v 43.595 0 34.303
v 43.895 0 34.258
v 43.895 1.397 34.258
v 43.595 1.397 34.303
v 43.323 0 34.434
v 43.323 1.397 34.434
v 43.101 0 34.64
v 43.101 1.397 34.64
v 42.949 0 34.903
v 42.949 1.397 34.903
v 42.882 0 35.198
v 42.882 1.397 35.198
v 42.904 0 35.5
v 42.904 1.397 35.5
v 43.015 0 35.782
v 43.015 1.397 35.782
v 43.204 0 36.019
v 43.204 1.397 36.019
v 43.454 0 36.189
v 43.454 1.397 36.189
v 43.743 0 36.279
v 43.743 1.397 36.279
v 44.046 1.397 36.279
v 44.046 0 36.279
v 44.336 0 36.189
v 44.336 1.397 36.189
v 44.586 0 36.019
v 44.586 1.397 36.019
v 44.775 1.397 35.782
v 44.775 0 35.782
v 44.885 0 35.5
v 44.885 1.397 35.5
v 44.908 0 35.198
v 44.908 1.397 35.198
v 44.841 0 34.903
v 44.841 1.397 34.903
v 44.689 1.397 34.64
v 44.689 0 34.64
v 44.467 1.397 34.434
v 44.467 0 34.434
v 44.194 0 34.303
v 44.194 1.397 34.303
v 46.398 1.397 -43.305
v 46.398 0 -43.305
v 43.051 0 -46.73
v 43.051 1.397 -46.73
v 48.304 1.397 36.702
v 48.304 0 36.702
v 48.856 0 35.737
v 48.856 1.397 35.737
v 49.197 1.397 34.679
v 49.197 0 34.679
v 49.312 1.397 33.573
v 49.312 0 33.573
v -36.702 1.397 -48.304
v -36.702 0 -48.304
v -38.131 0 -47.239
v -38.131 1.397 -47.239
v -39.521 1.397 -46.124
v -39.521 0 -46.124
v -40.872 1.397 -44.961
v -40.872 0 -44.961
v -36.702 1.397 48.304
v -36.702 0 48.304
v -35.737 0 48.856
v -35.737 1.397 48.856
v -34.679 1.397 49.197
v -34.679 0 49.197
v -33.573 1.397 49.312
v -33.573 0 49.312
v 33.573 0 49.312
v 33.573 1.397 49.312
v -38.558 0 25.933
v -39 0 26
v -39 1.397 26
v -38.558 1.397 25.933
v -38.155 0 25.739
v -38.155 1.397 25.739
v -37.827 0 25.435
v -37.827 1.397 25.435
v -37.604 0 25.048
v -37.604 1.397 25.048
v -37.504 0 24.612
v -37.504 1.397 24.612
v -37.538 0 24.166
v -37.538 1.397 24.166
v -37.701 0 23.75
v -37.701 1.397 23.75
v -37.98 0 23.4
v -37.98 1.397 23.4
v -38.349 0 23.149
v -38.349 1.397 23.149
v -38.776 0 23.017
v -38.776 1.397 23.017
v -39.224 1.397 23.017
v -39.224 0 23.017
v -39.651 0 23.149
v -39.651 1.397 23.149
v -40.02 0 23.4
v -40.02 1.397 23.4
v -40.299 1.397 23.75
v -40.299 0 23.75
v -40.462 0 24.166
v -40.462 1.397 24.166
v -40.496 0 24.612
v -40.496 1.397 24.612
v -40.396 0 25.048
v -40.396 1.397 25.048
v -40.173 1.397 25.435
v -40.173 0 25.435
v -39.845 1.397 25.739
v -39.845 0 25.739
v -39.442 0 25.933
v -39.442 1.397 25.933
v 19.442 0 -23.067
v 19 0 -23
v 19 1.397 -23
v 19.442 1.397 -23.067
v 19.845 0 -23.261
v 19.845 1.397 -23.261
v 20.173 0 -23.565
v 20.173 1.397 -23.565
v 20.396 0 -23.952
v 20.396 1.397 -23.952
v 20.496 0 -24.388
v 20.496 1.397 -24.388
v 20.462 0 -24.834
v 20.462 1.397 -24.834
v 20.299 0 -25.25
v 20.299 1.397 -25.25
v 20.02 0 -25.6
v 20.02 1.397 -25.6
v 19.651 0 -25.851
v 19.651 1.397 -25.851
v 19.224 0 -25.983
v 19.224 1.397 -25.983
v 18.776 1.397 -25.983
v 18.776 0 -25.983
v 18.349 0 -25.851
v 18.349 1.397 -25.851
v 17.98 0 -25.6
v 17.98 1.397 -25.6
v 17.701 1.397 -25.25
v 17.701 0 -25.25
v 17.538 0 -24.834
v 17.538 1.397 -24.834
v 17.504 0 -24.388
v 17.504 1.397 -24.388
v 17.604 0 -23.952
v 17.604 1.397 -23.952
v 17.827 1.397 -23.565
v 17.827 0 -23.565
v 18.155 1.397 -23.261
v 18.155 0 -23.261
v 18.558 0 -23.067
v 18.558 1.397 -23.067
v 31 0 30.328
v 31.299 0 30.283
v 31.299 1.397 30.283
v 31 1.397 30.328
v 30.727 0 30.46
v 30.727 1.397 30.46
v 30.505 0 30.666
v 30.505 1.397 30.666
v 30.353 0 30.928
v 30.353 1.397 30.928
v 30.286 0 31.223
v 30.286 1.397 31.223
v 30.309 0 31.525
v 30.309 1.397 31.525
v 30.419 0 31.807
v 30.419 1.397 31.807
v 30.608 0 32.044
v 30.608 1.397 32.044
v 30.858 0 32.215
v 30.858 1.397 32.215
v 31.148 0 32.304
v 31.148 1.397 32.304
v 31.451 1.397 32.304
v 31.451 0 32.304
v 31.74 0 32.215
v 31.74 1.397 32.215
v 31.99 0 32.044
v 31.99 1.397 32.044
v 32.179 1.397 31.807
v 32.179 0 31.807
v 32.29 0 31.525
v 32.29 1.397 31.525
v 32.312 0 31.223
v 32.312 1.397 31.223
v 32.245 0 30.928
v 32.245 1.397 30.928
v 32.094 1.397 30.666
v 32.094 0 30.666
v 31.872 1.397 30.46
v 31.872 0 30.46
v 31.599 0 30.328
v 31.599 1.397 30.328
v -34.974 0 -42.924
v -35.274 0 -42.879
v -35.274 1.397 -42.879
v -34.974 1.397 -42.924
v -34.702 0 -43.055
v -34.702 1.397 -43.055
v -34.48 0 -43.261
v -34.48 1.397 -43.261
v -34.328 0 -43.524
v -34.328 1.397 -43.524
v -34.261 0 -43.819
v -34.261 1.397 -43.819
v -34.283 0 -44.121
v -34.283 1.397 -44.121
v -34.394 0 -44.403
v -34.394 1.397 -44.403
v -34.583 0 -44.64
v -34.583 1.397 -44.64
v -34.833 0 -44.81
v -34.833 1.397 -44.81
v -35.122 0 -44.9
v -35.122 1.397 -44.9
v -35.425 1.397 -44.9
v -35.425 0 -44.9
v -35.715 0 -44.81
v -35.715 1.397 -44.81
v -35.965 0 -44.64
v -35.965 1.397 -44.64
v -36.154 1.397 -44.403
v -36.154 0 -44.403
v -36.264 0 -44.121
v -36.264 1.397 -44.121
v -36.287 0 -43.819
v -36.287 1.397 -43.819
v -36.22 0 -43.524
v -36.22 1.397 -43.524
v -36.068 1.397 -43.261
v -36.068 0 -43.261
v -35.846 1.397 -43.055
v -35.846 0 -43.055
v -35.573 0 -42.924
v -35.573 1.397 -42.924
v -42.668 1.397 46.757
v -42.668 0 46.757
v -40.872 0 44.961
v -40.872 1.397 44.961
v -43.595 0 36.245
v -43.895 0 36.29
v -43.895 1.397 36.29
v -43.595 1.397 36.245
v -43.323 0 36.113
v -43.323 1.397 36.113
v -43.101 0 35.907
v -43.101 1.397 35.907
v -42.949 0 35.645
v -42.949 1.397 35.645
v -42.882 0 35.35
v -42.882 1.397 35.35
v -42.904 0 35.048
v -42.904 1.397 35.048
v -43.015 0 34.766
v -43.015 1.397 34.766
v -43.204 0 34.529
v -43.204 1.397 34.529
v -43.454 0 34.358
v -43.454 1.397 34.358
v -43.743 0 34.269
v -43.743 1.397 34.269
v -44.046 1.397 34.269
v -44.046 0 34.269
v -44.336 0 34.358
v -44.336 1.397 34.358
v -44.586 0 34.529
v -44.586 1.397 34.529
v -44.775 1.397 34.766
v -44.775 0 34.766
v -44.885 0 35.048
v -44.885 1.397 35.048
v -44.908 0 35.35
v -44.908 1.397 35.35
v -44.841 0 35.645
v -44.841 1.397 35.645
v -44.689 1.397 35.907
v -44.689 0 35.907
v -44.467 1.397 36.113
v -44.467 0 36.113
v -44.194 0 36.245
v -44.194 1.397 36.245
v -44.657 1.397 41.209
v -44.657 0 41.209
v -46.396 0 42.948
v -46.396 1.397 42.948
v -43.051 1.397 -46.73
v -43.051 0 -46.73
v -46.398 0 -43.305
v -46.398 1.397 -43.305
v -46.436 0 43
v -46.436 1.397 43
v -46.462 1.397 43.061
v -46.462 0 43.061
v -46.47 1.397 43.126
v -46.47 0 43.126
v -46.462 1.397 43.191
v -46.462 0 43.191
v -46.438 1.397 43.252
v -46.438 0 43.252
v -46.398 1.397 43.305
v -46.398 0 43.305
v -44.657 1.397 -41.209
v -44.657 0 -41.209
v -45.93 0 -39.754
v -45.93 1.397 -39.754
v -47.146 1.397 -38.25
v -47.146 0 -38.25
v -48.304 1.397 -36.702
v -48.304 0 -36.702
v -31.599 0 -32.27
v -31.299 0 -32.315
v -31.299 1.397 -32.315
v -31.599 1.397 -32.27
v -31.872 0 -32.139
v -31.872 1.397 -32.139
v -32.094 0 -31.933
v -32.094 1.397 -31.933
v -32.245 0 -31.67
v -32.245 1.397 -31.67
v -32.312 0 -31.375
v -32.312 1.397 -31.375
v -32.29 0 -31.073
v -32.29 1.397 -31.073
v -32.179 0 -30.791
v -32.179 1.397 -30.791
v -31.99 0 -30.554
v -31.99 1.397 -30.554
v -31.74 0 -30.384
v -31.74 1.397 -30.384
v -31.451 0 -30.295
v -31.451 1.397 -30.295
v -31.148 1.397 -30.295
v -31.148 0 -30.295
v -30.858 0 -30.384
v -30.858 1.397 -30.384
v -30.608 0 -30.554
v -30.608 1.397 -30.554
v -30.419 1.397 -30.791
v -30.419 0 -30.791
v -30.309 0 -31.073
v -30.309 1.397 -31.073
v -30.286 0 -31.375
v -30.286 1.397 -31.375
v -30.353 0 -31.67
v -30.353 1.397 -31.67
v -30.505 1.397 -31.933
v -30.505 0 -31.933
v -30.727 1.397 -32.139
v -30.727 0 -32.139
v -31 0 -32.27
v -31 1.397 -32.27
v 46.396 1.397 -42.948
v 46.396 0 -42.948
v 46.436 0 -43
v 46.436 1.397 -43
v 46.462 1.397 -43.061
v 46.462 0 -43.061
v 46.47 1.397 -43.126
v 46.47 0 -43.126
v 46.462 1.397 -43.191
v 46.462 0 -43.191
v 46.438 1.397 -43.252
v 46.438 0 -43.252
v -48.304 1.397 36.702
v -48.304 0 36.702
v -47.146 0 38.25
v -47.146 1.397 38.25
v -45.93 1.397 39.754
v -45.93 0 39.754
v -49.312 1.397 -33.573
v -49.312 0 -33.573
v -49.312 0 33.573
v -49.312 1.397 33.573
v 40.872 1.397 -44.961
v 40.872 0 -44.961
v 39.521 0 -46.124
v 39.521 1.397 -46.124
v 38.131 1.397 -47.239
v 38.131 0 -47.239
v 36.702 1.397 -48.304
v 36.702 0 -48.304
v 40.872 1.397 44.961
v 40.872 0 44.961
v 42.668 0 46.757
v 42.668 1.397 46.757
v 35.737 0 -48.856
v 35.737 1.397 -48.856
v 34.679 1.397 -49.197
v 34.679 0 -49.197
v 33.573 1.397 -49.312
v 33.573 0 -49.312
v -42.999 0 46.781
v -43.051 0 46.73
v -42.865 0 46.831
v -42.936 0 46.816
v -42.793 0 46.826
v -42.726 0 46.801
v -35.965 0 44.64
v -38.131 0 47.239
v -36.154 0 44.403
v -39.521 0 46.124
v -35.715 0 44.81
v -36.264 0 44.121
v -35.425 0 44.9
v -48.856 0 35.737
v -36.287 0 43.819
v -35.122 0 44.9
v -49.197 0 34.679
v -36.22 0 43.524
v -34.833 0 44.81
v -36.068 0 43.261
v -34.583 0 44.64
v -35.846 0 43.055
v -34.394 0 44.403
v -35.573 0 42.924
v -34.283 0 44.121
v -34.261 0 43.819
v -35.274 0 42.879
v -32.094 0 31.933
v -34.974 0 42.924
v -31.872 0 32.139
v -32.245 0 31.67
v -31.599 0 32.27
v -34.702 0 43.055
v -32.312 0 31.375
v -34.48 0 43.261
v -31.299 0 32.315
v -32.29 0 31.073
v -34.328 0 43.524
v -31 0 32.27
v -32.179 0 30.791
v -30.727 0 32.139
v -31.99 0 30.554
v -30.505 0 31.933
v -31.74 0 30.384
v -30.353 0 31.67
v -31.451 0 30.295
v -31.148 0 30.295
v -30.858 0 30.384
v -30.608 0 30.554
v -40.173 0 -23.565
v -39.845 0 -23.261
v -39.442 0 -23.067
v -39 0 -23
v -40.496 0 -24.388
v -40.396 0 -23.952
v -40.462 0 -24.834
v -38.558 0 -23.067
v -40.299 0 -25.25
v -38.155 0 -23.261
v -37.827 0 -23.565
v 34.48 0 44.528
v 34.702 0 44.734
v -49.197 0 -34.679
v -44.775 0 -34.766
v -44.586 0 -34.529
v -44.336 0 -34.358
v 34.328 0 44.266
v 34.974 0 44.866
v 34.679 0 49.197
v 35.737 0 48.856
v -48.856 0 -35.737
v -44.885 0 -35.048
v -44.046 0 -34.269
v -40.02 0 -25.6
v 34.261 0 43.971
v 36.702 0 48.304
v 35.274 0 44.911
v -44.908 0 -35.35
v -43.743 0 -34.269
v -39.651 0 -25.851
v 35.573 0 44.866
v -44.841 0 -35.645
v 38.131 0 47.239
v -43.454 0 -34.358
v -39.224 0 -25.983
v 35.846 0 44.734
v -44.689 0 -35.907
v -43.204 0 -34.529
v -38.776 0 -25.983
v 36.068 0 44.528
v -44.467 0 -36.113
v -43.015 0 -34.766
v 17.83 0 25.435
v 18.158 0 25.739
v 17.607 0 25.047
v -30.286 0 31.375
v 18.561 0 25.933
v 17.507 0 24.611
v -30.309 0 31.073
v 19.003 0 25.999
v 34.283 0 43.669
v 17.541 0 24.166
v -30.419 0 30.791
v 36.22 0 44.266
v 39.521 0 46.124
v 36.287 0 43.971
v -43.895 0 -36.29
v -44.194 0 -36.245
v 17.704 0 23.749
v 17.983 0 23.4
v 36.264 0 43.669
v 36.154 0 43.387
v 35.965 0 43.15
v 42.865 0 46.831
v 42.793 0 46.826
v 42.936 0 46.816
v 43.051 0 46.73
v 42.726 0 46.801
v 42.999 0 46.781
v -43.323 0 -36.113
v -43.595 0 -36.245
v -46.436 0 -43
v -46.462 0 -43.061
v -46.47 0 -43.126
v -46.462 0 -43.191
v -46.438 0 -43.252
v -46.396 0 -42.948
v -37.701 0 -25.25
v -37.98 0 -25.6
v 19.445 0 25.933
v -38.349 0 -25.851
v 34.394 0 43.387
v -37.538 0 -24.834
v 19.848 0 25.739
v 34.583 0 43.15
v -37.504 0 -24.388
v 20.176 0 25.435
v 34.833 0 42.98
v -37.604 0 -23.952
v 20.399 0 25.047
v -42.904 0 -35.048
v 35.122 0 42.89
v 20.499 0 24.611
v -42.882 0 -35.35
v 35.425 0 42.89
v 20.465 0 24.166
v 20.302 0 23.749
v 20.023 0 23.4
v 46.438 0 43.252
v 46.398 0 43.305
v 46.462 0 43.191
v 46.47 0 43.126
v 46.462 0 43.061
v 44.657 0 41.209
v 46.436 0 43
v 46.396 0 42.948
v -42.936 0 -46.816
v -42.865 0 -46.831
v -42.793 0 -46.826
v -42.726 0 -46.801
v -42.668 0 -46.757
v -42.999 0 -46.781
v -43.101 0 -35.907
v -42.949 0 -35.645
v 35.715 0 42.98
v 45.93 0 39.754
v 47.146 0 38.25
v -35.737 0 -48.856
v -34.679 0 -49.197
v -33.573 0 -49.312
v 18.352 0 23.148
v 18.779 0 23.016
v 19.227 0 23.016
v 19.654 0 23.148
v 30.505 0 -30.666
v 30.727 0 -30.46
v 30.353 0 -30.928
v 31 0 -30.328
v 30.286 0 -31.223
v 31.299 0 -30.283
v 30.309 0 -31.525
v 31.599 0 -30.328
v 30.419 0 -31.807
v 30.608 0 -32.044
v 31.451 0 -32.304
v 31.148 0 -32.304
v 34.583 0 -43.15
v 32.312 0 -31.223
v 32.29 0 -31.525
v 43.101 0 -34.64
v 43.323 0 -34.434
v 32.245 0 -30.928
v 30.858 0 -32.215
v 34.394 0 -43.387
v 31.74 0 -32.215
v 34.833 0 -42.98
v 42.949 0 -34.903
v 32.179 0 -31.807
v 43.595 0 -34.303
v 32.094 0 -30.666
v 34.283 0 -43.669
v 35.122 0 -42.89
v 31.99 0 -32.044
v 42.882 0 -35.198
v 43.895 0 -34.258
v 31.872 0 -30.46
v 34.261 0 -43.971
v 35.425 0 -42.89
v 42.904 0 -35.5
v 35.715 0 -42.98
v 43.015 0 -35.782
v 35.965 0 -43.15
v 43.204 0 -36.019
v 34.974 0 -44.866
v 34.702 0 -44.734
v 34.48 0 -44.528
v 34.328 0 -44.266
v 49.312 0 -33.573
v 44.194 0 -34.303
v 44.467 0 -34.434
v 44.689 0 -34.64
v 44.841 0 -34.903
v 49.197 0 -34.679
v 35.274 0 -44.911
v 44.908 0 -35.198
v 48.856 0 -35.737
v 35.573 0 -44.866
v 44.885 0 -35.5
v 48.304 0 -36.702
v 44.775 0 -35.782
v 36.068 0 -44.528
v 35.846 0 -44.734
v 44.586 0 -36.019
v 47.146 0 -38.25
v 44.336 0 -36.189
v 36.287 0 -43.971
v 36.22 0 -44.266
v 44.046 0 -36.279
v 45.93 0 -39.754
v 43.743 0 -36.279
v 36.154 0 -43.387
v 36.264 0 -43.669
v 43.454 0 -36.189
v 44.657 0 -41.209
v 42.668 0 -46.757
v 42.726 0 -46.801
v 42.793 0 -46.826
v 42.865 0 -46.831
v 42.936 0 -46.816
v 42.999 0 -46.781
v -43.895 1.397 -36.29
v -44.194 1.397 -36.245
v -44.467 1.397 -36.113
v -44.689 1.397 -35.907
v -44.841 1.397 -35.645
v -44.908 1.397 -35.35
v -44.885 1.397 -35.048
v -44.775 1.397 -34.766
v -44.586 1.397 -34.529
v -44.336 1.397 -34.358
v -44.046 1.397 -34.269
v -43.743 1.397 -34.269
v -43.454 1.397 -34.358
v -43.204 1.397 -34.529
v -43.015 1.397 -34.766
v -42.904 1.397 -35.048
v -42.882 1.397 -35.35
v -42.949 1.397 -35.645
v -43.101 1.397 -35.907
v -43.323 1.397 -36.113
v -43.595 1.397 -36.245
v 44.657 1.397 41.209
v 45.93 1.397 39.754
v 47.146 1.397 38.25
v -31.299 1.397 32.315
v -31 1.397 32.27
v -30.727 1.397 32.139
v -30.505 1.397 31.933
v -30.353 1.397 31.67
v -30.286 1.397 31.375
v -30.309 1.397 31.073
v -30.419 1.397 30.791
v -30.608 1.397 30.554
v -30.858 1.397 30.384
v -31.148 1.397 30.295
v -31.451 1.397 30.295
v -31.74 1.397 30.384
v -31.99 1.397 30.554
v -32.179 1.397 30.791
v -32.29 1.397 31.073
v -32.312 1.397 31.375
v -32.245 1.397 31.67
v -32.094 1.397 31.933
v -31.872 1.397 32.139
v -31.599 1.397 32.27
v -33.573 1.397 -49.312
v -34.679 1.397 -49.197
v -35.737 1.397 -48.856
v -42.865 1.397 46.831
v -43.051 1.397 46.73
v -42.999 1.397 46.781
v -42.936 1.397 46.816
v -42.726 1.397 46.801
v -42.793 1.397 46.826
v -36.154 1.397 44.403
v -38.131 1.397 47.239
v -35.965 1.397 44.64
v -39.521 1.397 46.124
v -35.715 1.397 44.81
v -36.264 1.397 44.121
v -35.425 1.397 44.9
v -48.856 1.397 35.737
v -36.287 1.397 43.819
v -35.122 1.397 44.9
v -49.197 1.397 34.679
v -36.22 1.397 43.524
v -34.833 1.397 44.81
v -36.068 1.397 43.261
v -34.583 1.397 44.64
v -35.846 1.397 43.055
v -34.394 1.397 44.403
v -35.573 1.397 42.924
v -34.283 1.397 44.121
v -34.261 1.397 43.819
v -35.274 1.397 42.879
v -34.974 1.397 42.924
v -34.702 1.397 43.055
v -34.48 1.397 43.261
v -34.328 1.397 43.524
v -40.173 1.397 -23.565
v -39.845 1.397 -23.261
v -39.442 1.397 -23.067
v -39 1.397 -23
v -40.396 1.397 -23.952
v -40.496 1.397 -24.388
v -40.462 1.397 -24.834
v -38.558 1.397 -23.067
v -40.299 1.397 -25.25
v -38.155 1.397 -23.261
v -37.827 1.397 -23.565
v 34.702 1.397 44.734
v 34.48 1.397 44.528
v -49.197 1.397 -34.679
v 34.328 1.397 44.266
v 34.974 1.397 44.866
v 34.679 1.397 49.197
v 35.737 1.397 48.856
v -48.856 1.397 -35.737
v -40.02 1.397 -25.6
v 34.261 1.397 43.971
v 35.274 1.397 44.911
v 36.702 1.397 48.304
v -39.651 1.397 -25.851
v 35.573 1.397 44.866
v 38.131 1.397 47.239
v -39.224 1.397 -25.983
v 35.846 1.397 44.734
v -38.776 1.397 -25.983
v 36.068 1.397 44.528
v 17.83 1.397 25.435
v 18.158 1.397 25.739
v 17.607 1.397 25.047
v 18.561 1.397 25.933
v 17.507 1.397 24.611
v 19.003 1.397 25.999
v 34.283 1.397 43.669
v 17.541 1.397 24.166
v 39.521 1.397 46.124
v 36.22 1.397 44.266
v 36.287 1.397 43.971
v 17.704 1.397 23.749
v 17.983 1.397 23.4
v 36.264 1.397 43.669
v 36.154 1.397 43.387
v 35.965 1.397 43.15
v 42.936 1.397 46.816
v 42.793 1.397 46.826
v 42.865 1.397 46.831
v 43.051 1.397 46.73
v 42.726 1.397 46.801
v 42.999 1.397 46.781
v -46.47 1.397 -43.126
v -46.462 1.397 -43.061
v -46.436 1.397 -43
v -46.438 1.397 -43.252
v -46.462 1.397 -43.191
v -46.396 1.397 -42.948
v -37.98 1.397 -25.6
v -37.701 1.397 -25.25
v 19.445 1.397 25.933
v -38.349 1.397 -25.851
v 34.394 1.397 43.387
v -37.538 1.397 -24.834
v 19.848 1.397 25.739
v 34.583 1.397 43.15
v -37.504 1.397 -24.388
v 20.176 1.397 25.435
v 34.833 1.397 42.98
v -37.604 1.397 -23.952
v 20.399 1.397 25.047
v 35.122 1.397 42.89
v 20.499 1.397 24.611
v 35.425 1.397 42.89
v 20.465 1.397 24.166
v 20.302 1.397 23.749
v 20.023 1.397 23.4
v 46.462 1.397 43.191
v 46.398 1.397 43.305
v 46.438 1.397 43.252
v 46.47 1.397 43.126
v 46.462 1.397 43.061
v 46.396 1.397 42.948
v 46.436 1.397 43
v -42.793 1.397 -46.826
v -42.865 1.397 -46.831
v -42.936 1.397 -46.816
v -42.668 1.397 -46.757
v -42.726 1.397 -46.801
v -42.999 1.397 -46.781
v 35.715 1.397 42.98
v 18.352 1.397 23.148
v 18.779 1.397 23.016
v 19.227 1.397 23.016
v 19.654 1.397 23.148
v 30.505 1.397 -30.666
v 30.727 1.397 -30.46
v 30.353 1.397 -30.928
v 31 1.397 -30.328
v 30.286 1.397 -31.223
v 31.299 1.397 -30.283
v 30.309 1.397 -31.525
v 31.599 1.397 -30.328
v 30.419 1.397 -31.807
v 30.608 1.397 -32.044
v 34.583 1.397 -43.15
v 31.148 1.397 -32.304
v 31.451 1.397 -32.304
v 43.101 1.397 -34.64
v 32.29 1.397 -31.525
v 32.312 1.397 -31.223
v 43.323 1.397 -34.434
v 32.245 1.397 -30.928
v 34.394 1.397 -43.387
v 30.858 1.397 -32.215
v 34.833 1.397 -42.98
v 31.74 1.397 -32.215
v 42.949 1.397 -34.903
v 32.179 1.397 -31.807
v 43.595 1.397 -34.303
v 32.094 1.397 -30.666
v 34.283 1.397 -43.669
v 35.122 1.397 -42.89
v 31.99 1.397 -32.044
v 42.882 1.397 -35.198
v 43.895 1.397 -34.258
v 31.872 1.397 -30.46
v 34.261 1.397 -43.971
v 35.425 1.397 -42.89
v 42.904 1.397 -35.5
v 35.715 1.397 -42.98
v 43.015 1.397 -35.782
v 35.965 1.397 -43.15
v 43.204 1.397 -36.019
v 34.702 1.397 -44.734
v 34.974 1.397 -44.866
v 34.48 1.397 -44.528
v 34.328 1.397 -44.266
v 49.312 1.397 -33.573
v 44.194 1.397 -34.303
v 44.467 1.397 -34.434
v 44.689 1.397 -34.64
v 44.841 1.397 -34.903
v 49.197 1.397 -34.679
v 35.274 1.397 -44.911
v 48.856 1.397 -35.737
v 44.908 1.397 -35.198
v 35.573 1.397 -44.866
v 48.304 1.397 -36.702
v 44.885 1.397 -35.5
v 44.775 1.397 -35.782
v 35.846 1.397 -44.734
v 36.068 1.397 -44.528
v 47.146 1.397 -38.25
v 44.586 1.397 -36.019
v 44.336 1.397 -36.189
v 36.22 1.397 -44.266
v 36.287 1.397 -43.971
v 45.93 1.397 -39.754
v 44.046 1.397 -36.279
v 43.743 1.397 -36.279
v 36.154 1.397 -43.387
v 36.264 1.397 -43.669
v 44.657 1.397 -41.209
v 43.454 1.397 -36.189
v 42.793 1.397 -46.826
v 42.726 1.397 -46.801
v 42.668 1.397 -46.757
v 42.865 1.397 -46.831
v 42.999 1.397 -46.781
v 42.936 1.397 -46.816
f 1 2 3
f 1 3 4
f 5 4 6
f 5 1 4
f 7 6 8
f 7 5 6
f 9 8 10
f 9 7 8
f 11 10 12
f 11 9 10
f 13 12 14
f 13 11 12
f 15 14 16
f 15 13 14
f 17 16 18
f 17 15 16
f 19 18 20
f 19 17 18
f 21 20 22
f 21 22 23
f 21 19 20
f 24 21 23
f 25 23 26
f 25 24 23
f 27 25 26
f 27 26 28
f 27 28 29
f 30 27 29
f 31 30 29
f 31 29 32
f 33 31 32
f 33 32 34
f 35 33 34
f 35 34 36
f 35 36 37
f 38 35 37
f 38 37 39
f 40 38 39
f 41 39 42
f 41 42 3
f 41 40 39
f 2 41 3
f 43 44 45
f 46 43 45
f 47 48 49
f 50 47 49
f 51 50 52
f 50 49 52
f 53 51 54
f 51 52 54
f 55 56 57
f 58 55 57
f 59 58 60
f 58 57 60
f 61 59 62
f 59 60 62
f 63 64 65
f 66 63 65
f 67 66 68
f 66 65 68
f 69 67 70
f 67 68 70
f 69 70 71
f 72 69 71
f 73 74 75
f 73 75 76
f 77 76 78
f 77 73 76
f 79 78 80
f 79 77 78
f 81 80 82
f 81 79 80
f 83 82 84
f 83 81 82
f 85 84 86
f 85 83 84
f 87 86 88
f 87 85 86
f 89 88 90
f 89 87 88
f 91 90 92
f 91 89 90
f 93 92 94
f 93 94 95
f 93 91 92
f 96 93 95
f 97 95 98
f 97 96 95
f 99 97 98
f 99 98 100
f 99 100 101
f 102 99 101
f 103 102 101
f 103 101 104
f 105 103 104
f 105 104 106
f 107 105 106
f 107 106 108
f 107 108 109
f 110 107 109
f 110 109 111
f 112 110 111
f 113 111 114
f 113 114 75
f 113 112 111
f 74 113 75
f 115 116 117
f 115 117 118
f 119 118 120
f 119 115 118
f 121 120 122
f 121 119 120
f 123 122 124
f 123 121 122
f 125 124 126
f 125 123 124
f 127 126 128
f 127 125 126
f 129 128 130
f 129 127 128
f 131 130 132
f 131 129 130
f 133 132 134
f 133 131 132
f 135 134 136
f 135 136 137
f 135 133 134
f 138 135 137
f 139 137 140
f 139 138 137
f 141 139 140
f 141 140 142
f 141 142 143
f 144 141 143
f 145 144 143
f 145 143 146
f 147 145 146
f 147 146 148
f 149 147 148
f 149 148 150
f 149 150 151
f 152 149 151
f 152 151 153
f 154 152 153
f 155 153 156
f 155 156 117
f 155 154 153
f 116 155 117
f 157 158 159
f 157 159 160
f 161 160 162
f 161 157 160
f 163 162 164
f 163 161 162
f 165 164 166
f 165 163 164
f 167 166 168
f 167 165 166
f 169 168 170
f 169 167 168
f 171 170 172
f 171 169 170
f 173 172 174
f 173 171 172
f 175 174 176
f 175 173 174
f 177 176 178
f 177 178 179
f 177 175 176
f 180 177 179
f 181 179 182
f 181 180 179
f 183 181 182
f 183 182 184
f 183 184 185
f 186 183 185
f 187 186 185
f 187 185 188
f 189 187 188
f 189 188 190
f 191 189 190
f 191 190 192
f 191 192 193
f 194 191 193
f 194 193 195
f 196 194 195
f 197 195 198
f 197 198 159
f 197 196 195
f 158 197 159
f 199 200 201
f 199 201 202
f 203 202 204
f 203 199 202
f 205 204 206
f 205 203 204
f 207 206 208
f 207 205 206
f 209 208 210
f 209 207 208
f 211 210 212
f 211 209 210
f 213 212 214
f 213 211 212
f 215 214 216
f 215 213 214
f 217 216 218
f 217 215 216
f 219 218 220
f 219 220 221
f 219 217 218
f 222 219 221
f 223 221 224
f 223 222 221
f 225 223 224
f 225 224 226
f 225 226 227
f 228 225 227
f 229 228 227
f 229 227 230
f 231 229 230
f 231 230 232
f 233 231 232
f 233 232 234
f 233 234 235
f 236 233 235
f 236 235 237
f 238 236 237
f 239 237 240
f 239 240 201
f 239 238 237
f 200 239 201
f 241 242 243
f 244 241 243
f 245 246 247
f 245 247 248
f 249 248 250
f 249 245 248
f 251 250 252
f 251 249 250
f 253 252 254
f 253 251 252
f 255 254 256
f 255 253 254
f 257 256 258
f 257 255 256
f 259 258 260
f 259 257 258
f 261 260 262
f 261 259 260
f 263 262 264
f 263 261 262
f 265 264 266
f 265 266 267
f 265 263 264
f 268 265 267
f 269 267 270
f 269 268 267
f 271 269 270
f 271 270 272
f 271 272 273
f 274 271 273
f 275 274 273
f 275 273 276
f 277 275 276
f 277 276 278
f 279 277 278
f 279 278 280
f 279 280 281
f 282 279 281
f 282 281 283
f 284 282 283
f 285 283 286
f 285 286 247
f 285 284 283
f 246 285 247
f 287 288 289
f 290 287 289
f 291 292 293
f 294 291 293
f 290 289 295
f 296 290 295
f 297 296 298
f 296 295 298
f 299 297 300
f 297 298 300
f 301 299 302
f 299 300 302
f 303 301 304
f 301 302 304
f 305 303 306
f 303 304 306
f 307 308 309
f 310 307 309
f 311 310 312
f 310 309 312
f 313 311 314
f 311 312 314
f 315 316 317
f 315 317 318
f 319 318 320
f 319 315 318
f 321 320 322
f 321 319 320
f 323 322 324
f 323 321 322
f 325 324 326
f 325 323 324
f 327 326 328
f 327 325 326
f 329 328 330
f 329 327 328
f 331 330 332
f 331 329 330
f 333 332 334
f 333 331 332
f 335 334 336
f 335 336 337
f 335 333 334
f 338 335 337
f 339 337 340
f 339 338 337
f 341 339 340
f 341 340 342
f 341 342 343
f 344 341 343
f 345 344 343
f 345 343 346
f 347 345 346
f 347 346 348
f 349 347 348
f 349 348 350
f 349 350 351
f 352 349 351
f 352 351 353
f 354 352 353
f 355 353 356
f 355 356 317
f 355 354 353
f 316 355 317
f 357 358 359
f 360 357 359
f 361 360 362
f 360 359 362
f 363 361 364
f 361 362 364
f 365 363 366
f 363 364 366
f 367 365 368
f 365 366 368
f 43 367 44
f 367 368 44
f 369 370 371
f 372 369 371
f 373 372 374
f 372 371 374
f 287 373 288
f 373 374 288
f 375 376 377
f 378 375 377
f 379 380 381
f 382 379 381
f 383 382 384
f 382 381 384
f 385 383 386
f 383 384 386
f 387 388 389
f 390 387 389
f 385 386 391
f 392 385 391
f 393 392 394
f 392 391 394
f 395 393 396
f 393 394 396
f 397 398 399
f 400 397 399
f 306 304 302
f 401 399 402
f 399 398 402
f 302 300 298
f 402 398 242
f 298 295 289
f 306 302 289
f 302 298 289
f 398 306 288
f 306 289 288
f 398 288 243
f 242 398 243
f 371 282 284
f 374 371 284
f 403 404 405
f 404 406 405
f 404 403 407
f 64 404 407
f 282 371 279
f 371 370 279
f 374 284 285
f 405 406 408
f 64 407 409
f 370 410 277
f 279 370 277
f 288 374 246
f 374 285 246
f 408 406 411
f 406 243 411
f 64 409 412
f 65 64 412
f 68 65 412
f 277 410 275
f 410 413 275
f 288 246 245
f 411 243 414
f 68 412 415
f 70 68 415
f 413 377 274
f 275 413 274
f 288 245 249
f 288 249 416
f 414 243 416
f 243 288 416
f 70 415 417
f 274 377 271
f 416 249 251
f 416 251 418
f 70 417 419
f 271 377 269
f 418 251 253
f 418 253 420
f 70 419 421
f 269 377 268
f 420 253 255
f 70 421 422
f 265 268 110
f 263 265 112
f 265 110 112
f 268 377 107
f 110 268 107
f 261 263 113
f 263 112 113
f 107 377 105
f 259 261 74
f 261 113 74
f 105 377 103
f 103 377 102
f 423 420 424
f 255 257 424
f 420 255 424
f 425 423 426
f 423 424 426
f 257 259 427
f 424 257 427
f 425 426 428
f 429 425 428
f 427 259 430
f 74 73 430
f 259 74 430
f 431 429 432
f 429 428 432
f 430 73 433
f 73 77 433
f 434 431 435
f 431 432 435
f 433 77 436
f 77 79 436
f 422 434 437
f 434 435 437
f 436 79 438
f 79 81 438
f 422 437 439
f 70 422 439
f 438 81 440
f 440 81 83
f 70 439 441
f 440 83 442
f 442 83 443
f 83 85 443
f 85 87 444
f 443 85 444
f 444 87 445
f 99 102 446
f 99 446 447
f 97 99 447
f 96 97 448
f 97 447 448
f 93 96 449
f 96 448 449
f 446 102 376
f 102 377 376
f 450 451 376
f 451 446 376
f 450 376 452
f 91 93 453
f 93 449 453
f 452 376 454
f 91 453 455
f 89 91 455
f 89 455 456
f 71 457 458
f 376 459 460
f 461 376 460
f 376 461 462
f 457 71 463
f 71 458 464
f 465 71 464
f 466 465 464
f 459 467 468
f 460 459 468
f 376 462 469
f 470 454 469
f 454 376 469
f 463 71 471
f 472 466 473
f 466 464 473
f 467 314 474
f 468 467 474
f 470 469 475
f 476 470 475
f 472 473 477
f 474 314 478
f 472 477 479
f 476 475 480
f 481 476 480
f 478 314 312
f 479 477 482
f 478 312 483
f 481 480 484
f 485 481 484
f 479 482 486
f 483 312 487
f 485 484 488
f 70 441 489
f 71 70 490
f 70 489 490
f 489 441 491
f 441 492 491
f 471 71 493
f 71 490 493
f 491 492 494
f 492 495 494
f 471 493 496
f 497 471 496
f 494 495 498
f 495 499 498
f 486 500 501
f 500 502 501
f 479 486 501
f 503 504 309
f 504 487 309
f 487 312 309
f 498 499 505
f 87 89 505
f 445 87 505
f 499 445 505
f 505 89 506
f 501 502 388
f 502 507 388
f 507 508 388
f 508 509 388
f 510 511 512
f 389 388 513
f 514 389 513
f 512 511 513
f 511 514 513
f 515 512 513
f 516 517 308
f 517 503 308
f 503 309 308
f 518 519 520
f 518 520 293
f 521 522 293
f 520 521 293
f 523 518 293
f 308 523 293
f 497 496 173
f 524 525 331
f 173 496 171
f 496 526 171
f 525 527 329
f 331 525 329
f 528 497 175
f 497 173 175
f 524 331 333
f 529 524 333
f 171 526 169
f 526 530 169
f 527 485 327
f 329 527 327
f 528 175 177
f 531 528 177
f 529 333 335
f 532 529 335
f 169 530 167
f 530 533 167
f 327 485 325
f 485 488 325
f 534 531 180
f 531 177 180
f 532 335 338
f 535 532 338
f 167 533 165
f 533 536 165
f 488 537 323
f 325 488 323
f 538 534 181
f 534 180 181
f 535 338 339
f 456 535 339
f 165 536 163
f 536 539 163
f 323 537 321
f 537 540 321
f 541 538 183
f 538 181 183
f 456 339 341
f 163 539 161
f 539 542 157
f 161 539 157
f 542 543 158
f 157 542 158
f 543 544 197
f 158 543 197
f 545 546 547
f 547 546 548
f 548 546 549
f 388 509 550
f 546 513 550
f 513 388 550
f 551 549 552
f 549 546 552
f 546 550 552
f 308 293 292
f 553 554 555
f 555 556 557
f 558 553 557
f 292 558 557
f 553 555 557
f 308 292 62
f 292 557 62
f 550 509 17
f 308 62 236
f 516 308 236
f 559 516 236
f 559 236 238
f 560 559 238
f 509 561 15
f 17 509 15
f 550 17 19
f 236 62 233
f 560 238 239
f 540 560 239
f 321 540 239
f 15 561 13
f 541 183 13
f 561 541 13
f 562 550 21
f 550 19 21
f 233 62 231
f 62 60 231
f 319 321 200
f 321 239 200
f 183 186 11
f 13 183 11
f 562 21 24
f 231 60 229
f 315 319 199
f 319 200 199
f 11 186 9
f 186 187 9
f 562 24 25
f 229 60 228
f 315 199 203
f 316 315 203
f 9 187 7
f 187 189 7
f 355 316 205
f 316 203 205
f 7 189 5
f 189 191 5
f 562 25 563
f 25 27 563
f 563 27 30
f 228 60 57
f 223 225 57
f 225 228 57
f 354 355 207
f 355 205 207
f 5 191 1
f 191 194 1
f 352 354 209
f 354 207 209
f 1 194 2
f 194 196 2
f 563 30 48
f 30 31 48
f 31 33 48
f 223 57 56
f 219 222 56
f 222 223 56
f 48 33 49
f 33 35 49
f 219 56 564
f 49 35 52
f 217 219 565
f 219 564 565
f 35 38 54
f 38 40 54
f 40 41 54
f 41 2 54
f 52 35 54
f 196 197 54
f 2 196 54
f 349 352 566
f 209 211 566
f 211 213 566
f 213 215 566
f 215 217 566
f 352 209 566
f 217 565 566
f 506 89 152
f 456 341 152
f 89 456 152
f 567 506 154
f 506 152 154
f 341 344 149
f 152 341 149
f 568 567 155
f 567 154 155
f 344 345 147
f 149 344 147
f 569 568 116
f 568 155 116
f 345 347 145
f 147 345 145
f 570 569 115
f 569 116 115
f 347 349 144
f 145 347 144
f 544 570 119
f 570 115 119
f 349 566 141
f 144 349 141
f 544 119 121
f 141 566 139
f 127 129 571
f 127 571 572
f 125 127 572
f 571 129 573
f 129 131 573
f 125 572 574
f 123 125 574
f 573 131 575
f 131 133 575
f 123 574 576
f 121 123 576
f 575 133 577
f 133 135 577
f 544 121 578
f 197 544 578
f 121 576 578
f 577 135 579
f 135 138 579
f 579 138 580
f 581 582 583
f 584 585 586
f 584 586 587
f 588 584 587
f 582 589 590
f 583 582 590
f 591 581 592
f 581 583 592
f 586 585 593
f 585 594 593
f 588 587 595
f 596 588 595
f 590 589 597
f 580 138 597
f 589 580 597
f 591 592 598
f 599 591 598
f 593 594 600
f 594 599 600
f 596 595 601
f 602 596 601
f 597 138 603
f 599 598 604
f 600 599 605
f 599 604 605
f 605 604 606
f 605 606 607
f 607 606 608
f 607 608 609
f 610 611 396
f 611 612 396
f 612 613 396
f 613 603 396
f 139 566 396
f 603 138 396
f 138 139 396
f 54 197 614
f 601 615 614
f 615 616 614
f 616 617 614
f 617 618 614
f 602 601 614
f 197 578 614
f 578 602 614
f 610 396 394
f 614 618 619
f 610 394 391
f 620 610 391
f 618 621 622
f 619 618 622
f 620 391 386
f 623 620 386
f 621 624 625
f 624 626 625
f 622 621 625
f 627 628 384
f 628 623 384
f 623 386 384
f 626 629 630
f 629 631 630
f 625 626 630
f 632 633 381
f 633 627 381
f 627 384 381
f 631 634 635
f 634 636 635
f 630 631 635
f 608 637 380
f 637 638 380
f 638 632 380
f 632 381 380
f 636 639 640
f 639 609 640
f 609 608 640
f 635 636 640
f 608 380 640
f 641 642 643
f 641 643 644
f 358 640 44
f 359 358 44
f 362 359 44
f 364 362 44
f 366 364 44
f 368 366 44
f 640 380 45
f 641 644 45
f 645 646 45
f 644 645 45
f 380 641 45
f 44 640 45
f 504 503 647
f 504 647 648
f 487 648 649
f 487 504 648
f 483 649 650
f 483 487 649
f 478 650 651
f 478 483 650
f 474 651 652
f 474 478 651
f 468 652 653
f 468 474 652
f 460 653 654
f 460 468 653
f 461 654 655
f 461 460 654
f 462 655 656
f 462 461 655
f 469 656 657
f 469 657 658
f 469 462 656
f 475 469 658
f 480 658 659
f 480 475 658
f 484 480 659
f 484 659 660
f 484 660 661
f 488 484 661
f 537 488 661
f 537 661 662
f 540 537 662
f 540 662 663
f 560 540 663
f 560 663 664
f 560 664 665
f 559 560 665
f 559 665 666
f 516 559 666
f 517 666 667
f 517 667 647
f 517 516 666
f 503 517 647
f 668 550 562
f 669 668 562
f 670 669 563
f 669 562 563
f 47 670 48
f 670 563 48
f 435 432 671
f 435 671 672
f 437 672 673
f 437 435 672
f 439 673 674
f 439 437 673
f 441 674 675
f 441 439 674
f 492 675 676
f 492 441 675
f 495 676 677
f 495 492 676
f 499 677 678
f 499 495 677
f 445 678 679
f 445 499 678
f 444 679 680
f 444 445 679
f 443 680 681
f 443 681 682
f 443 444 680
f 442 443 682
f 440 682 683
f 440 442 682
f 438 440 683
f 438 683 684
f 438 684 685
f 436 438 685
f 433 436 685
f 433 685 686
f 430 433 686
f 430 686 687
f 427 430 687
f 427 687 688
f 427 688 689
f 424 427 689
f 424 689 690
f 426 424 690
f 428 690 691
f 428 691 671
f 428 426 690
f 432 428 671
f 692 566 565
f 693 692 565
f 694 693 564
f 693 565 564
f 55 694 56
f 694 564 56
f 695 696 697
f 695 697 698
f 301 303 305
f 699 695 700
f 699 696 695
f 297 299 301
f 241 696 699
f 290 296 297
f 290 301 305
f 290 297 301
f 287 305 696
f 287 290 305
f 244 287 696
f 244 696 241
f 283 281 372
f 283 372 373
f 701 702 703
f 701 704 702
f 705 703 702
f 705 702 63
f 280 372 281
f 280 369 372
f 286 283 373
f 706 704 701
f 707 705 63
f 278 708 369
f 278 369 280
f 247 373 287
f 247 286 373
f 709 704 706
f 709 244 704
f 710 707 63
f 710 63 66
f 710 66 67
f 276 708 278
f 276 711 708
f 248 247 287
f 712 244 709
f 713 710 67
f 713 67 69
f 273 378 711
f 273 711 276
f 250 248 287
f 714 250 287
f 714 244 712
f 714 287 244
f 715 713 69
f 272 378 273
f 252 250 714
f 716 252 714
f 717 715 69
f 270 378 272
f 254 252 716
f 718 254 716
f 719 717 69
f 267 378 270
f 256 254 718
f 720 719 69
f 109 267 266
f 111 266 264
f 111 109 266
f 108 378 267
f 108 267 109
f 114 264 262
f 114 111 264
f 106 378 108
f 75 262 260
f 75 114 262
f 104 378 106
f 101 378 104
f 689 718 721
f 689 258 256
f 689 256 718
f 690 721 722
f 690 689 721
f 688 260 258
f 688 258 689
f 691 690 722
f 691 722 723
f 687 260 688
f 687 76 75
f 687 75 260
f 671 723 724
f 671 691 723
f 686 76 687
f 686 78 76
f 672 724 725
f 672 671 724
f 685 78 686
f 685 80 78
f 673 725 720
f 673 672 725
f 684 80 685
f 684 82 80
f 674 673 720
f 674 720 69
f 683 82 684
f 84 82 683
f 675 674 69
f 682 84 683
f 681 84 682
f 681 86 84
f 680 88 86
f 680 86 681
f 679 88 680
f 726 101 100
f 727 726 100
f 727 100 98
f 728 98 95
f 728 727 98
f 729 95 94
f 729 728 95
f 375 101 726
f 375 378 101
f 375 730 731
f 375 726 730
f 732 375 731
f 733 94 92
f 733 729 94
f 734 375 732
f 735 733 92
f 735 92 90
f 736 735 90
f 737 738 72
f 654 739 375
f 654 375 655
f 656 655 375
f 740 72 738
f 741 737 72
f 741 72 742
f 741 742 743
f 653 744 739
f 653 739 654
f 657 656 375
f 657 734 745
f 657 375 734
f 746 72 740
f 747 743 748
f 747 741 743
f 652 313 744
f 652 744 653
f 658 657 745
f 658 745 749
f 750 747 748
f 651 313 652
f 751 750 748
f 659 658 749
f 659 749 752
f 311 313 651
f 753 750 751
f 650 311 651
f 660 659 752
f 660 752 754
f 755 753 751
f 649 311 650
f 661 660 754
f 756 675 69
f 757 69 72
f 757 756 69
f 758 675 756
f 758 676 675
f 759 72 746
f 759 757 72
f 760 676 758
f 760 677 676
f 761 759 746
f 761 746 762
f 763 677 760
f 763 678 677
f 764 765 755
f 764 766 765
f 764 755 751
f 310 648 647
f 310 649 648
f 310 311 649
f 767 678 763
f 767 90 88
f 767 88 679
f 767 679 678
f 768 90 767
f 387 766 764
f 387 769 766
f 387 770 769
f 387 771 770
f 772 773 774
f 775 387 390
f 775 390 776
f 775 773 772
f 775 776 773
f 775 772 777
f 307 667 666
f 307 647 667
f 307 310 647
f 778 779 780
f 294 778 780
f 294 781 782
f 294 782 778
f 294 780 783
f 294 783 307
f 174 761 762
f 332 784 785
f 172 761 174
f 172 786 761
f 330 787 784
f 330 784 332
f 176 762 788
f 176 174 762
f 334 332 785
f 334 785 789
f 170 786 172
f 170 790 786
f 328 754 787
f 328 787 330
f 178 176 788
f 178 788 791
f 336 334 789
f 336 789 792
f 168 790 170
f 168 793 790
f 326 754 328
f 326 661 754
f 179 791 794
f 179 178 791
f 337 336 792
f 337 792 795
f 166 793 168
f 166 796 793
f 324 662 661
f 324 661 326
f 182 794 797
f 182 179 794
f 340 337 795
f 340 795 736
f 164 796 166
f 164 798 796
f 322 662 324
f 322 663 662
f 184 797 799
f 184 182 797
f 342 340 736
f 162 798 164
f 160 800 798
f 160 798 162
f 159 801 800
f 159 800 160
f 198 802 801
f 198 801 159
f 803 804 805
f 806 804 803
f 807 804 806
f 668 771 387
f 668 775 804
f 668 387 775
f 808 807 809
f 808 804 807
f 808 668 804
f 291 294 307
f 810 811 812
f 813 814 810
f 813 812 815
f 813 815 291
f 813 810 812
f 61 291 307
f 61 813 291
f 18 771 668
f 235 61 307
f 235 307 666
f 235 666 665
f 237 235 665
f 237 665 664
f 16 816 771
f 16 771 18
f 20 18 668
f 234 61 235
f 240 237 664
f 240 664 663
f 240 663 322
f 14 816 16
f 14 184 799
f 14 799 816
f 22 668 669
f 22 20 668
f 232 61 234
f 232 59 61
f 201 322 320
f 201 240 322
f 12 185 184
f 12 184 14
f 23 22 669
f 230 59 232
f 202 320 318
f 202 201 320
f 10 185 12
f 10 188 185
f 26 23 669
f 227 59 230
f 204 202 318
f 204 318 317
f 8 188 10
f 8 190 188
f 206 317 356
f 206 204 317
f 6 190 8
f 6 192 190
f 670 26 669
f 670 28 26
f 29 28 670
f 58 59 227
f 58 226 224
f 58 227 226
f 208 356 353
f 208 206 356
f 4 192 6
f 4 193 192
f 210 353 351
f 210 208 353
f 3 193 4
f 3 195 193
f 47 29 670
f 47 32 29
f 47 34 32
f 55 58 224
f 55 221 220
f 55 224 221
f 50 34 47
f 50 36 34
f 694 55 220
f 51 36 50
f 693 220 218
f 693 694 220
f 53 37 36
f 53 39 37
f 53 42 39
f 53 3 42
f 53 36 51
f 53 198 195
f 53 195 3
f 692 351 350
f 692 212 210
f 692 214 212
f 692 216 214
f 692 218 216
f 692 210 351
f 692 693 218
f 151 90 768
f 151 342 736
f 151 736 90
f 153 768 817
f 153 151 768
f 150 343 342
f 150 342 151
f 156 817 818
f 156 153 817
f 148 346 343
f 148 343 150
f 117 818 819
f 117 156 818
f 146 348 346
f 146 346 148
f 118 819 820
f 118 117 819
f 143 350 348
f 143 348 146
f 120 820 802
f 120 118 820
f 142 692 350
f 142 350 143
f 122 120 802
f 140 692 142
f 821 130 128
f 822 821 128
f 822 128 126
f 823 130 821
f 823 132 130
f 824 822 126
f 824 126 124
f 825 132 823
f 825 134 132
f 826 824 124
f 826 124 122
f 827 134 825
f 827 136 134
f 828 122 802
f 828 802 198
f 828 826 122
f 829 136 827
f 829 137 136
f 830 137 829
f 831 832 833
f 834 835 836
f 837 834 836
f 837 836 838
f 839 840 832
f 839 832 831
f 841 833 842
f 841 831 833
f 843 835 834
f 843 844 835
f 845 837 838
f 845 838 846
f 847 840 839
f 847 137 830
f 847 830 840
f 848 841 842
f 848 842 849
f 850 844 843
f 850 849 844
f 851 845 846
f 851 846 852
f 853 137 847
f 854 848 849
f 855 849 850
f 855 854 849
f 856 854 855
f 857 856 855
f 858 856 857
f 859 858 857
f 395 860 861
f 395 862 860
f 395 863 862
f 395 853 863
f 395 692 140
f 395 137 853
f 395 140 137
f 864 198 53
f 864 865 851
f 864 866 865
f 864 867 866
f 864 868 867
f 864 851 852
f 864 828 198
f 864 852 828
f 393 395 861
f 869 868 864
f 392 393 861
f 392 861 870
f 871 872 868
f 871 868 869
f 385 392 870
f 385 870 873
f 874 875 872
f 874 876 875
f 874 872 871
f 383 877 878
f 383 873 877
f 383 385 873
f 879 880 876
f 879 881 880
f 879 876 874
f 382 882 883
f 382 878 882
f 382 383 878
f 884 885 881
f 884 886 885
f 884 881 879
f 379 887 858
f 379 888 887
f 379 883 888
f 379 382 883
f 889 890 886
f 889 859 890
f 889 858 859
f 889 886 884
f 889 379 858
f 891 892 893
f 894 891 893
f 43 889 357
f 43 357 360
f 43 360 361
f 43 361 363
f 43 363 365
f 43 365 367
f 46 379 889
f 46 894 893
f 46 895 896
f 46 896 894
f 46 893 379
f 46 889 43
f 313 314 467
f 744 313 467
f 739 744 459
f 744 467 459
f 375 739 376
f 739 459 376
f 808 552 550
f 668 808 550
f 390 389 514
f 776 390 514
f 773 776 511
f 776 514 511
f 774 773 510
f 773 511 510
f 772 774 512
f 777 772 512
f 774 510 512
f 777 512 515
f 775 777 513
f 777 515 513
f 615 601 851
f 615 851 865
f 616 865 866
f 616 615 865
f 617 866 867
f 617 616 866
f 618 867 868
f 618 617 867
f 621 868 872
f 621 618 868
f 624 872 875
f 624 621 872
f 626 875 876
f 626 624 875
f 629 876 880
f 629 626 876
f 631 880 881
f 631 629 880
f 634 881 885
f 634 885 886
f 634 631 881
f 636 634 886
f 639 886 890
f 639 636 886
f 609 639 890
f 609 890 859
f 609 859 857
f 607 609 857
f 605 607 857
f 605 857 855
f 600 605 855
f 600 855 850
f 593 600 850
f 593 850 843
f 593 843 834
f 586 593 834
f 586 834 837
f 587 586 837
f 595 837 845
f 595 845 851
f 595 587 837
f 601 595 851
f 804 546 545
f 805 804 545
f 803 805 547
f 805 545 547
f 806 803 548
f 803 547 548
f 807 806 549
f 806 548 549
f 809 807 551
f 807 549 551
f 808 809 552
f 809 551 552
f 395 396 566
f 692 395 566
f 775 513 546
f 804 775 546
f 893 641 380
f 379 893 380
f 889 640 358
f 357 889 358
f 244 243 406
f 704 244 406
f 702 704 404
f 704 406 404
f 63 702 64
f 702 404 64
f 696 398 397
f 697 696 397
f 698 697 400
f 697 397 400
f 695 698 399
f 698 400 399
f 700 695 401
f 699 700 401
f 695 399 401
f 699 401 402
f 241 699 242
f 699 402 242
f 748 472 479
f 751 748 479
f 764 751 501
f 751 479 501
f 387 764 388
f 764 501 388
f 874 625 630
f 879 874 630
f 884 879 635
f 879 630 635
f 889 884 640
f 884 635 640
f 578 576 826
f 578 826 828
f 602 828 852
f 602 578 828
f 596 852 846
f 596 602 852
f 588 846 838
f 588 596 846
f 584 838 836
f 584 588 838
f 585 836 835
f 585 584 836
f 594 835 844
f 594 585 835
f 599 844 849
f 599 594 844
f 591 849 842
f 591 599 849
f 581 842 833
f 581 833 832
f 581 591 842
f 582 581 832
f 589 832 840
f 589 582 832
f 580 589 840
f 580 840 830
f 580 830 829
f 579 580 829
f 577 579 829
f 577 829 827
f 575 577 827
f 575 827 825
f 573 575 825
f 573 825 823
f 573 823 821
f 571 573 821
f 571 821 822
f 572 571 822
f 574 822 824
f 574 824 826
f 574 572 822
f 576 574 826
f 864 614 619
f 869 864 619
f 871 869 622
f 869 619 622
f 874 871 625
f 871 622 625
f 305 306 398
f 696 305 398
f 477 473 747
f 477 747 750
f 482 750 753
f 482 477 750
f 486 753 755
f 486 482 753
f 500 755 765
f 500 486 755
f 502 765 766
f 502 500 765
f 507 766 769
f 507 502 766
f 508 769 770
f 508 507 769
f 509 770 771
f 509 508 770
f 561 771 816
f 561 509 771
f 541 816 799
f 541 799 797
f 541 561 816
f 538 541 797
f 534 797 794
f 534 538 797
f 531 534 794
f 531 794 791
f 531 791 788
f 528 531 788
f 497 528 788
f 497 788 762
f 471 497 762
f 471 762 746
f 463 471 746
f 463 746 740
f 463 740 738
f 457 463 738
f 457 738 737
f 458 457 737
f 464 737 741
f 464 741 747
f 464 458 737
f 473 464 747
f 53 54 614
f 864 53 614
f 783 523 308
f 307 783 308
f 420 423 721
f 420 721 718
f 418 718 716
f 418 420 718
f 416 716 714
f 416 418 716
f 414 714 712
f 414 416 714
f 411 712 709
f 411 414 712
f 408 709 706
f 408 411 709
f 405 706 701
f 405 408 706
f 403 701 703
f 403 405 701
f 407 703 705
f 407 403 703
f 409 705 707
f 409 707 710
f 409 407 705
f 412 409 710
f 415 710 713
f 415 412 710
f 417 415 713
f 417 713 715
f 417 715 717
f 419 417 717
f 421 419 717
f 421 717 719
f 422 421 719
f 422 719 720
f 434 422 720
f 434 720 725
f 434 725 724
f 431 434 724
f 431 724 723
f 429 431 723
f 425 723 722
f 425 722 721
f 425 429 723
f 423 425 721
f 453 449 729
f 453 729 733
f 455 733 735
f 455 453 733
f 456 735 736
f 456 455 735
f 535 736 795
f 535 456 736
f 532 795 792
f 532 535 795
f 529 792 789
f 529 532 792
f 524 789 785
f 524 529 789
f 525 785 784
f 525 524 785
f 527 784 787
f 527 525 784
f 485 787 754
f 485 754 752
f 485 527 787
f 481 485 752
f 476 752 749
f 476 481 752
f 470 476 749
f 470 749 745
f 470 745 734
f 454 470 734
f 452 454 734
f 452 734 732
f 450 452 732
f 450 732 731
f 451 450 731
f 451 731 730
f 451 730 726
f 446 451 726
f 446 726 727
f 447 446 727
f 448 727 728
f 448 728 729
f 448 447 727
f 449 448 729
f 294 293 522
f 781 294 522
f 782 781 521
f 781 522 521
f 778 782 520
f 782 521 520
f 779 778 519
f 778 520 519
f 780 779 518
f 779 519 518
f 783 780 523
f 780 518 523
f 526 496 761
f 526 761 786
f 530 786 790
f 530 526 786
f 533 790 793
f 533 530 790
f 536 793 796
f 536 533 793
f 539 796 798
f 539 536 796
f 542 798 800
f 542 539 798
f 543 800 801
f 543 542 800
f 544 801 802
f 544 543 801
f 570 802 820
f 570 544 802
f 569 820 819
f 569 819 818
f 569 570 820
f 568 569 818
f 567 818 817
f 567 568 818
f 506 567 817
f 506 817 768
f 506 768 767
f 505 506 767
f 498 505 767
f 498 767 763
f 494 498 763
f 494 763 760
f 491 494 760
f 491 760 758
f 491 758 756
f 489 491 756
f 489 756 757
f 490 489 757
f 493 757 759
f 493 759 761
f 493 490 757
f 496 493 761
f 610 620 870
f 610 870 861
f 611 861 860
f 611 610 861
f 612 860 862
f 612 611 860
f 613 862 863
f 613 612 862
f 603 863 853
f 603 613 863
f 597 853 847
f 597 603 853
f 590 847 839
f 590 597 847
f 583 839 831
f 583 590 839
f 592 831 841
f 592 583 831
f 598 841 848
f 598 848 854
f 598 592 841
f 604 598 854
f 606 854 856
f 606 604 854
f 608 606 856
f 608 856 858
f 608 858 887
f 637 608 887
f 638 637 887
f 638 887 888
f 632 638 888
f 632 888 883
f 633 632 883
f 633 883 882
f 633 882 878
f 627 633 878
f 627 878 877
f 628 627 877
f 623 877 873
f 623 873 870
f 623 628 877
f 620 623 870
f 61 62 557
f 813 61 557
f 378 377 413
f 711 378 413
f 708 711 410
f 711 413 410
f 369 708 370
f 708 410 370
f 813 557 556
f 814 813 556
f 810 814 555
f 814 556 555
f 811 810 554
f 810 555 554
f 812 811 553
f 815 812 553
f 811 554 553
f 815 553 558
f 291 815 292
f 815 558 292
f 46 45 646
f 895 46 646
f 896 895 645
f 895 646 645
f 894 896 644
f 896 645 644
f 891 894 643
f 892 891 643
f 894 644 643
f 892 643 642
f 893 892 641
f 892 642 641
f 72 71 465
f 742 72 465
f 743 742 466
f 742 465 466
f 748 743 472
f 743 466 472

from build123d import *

# Parameters (mm, degrees)
SKETCH1_R           = 1.016000002
SKETCH1_R_2         = 1.015999994
SKETCH1_R_3         = 1.016000004
SKETCH1_R_4         = 1.016000003
SKETCH1_R_5         = 1.5
BOSS_EXTRUDE1_DEPTH = 1.397


with BuildPart() as part:
    # Sketch1 → Boss-Extrude1 (new body)
    with BuildSketch(Plane(origin=(0, 0, 0), x_dir=(1, 0, 0), z_dir=(0, 1, 0))):
        with BuildLine():
            Line((-44.657487237, -41.209177315), (-46.396043566, -42.947733643))
            ThreePointArc((-46.396043566, -42.947733643), (-46.47043426, -43.125880979), (-46.398093321, -43.304870469))
            Line((-46.398093321, -43.304870469), (-43.050556902, -46.730153436))
            ThreePointArc((-43.050556902, -46.730153436), (-42.865374913, -46.831022486), (-42.667823962, -46.757262364))
            Line((-42.667823962, -46.757262364), (-40.871772737, -44.96121114))
            ThreePointArc((-40.871772737, -44.96121114), (-38.831009329, -46.687575031), (-36.702263747, -48.304204185))
            ThreePointArc((-36.702263747, -48.304204185), (-35.216668272, -49.053976946), (-33.572746514, -49.312190732))
            Line((-33.572746514, -49.312190732), (33.572746514, -49.312190732))
            ThreePointArc((33.572746514, -49.312190732), (35.216668272, -49.053976946), (36.702263747, -48.304204185))
            ThreePointArc((36.702263747, -48.304204185), (38.831009329, -46.687575031), (40.871772737, -44.96121114))
            Line((40.871772737, -44.96121114), (42.667823962, -46.757262364))
            ThreePointArc((42.667823962, -46.757262364), (42.865374913, -46.831022486), (43.050556902, -46.730153436))
            Line((43.050556902, -46.730153436), (46.398093321, -43.304870469))
            ThreePointArc((46.398093321, -43.304870469), (46.47043426, -43.125880979), (46.396043566, -42.947733643))
            Line((46.396043566, -42.947733643), (44.657487237, -41.209177315))
            ThreePointArc((44.657487237, -41.209177315), (46.545191327, -39.007785053), (48.304204175, -36.702263762))
            ThreePointArc((48.304204175, -36.702263762), (49.053976936, -35.216668286), (49.312190722, -33.572746527))
            Line((49.312190722, -33.572746527), (49.312190722, 33.572746527))
            ThreePointArc((49.312190722, 33.572746527), (49.053976936, 35.216668286), (48.304204175, 36.702263762))
            ThreePointArc((48.304204175, 36.702263762), (46.545191327, 39.007785053), (44.657487237, 41.209177315))
            Line((44.657487237, 41.209177315), (46.396043566, 42.947733643))
            ThreePointArc((46.396043566, 42.947733643), (46.47043426, 43.125880979), (46.398093321, 43.304870469))
            Line((46.398093321, 43.304870469), (43.050556902, 46.730153436))
            ThreePointArc((43.050556902, 46.730153436), (42.865374913, 46.831022486), (42.667823962, 46.757262364))
            Line((42.667823962, 46.757262364), (40.871772737, 44.96121114))
            ThreePointArc((40.871772737, 44.96121114), (38.831009329, 46.687575031), (36.702263747, 48.304204185))
            ThreePointArc((36.702263747, 48.304204185), (35.216668272, 49.053976946), (33.572746514, 49.312190732))
            Line((33.572746514, 49.312190732), (-33.572746514, 49.312190732))
            ThreePointArc((-33.572746514, 49.312190732), (-35.216668272, 49.053976946), (-36.702263747, 48.304204185))
            ThreePointArc((-36.702263747, 48.304204185), (-38.831009329, 46.687575031), (-40.871772737, 44.96121114))
            Line((-40.871772737, 44.96121114), (-42.667823962, 46.757262364))
            ThreePointArc((-42.667823962, 46.757262364), (-42.865374913, 46.831022486), (-43.050556902, 46.730153436))
            Line((-43.050556902, 46.730153436), (-46.398093321, 43.304870469))
            ThreePointArc((-46.398093321, 43.304870469), (-46.47043426, 43.125880979), (-46.396043566, 42.947733643))
            Line((-46.396043566, 42.947733643), (-44.657487237, 41.209177315))
            ThreePointArc((-44.657487237, 41.209177315), (-46.545191327, 39.007785053), (-48.304204175, 36.702263762))
            ThreePointArc((-48.304204175, 36.702263762), (-49.053976936, 35.216668286), (-49.312190722, 33.572746527))
            Line((-49.312190722, 33.572746527), (-49.312190722, -33.572746527))
            ThreePointArc((-49.312190722, -33.572746527), (-49.053976936, -35.216668286), (-48.304204175, -36.702263762))
            ThreePointArc((-48.304204175, -36.702263762), (-46.545191327, -39.007785053), (-44.657487237, -41.209177315))
        make_face()
        with Locations(Location((-35.273880312, -43.8949262, 0), (0, 0, 90))):
            Circle(SKETCH1_R, mode=Mode.SUBTRACT)
        with Locations(Location((-43.89492619, -35.273880325, 0), (0, 0, 270))):
            Circle(SKETCH1_R_2, mode=Mode.SUBTRACT)
        with Locations(Location((-31.299173987, -31.299173994, 0), (0, 0, 270))):
            Circle(SKETCH1_R, mode=Mode.SUBTRACT)
        with Locations(Location((43.89492619, -35.273880325, 0), (0, 0, 90))):
            Circle(SKETCH1_R_3, mode=Mode.SUBTRACT)
        with Locations(Location((35.273880312, -43.8949262, 0), (0, 0, 270))):
            Circle(SKETCH1_R_3, mode=Mode.SUBTRACT)
        with Locations(Location((31.299173987, -31.299173994, 0), (0, 0, 90))):
            Circle(SKETCH1_R, mode=Mode.SUBTRACT)
        with Locations(Location((-35.273880312, 43.8949262, 0), (0, 0, 270))):
            Circle(SKETCH1_R, mode=Mode.SUBTRACT)
        with Locations(Location((-31.299173987, 31.299173994, 0), (0, 0, 90))):
            Circle(SKETCH1_R, mode=Mode.SUBTRACT)
        with Locations(Location((-43.89492619, 35.273880325, 0), (0, 0, 90))):
            Circle(SKETCH1_R, mode=Mode.SUBTRACT)
        with Locations(Location((43.89492619, 35.273880325, 0), (0, 0, 270))):
            Circle(SKETCH1_R_4, mode=Mode.SUBTRACT)
        with Locations(Location((35.273880312, 43.8949262, 0), (0, 0, 90))):
            Circle(SKETCH1_R_3, mode=Mode.SUBTRACT)
        with Locations(Location((31.299173987, 31.299173994, 0), (0, 0, 270))):
            Circle(SKETCH1_R, mode=Mode.SUBTRACT)
        with Locations(Location((-39, 24.5, 0), (0, 0, 270))):
            Circle(SKETCH1_R_5, mode=Mode.SUBTRACT)
        with Locations(Location((19, 24.5, 0), (0, 0, 270))):
            Circle(SKETCH1_R_5, mode=Mode.SUBTRACT)
        with Locations(Location((19.002972949, -24.499403884, 0), (0, 0, 270))):
            Circle(SKETCH1_R_5, mode=Mode.SUBTRACT)
        with Locations(Location((-39, -24.5, 0), (0, 0, 270))):
            Circle(SKETCH1_R_5, mode=Mode.SUBTRACT)
    extrude(amount=BOSS_EXTRUDE1_DEPTH)


solid = part.part
